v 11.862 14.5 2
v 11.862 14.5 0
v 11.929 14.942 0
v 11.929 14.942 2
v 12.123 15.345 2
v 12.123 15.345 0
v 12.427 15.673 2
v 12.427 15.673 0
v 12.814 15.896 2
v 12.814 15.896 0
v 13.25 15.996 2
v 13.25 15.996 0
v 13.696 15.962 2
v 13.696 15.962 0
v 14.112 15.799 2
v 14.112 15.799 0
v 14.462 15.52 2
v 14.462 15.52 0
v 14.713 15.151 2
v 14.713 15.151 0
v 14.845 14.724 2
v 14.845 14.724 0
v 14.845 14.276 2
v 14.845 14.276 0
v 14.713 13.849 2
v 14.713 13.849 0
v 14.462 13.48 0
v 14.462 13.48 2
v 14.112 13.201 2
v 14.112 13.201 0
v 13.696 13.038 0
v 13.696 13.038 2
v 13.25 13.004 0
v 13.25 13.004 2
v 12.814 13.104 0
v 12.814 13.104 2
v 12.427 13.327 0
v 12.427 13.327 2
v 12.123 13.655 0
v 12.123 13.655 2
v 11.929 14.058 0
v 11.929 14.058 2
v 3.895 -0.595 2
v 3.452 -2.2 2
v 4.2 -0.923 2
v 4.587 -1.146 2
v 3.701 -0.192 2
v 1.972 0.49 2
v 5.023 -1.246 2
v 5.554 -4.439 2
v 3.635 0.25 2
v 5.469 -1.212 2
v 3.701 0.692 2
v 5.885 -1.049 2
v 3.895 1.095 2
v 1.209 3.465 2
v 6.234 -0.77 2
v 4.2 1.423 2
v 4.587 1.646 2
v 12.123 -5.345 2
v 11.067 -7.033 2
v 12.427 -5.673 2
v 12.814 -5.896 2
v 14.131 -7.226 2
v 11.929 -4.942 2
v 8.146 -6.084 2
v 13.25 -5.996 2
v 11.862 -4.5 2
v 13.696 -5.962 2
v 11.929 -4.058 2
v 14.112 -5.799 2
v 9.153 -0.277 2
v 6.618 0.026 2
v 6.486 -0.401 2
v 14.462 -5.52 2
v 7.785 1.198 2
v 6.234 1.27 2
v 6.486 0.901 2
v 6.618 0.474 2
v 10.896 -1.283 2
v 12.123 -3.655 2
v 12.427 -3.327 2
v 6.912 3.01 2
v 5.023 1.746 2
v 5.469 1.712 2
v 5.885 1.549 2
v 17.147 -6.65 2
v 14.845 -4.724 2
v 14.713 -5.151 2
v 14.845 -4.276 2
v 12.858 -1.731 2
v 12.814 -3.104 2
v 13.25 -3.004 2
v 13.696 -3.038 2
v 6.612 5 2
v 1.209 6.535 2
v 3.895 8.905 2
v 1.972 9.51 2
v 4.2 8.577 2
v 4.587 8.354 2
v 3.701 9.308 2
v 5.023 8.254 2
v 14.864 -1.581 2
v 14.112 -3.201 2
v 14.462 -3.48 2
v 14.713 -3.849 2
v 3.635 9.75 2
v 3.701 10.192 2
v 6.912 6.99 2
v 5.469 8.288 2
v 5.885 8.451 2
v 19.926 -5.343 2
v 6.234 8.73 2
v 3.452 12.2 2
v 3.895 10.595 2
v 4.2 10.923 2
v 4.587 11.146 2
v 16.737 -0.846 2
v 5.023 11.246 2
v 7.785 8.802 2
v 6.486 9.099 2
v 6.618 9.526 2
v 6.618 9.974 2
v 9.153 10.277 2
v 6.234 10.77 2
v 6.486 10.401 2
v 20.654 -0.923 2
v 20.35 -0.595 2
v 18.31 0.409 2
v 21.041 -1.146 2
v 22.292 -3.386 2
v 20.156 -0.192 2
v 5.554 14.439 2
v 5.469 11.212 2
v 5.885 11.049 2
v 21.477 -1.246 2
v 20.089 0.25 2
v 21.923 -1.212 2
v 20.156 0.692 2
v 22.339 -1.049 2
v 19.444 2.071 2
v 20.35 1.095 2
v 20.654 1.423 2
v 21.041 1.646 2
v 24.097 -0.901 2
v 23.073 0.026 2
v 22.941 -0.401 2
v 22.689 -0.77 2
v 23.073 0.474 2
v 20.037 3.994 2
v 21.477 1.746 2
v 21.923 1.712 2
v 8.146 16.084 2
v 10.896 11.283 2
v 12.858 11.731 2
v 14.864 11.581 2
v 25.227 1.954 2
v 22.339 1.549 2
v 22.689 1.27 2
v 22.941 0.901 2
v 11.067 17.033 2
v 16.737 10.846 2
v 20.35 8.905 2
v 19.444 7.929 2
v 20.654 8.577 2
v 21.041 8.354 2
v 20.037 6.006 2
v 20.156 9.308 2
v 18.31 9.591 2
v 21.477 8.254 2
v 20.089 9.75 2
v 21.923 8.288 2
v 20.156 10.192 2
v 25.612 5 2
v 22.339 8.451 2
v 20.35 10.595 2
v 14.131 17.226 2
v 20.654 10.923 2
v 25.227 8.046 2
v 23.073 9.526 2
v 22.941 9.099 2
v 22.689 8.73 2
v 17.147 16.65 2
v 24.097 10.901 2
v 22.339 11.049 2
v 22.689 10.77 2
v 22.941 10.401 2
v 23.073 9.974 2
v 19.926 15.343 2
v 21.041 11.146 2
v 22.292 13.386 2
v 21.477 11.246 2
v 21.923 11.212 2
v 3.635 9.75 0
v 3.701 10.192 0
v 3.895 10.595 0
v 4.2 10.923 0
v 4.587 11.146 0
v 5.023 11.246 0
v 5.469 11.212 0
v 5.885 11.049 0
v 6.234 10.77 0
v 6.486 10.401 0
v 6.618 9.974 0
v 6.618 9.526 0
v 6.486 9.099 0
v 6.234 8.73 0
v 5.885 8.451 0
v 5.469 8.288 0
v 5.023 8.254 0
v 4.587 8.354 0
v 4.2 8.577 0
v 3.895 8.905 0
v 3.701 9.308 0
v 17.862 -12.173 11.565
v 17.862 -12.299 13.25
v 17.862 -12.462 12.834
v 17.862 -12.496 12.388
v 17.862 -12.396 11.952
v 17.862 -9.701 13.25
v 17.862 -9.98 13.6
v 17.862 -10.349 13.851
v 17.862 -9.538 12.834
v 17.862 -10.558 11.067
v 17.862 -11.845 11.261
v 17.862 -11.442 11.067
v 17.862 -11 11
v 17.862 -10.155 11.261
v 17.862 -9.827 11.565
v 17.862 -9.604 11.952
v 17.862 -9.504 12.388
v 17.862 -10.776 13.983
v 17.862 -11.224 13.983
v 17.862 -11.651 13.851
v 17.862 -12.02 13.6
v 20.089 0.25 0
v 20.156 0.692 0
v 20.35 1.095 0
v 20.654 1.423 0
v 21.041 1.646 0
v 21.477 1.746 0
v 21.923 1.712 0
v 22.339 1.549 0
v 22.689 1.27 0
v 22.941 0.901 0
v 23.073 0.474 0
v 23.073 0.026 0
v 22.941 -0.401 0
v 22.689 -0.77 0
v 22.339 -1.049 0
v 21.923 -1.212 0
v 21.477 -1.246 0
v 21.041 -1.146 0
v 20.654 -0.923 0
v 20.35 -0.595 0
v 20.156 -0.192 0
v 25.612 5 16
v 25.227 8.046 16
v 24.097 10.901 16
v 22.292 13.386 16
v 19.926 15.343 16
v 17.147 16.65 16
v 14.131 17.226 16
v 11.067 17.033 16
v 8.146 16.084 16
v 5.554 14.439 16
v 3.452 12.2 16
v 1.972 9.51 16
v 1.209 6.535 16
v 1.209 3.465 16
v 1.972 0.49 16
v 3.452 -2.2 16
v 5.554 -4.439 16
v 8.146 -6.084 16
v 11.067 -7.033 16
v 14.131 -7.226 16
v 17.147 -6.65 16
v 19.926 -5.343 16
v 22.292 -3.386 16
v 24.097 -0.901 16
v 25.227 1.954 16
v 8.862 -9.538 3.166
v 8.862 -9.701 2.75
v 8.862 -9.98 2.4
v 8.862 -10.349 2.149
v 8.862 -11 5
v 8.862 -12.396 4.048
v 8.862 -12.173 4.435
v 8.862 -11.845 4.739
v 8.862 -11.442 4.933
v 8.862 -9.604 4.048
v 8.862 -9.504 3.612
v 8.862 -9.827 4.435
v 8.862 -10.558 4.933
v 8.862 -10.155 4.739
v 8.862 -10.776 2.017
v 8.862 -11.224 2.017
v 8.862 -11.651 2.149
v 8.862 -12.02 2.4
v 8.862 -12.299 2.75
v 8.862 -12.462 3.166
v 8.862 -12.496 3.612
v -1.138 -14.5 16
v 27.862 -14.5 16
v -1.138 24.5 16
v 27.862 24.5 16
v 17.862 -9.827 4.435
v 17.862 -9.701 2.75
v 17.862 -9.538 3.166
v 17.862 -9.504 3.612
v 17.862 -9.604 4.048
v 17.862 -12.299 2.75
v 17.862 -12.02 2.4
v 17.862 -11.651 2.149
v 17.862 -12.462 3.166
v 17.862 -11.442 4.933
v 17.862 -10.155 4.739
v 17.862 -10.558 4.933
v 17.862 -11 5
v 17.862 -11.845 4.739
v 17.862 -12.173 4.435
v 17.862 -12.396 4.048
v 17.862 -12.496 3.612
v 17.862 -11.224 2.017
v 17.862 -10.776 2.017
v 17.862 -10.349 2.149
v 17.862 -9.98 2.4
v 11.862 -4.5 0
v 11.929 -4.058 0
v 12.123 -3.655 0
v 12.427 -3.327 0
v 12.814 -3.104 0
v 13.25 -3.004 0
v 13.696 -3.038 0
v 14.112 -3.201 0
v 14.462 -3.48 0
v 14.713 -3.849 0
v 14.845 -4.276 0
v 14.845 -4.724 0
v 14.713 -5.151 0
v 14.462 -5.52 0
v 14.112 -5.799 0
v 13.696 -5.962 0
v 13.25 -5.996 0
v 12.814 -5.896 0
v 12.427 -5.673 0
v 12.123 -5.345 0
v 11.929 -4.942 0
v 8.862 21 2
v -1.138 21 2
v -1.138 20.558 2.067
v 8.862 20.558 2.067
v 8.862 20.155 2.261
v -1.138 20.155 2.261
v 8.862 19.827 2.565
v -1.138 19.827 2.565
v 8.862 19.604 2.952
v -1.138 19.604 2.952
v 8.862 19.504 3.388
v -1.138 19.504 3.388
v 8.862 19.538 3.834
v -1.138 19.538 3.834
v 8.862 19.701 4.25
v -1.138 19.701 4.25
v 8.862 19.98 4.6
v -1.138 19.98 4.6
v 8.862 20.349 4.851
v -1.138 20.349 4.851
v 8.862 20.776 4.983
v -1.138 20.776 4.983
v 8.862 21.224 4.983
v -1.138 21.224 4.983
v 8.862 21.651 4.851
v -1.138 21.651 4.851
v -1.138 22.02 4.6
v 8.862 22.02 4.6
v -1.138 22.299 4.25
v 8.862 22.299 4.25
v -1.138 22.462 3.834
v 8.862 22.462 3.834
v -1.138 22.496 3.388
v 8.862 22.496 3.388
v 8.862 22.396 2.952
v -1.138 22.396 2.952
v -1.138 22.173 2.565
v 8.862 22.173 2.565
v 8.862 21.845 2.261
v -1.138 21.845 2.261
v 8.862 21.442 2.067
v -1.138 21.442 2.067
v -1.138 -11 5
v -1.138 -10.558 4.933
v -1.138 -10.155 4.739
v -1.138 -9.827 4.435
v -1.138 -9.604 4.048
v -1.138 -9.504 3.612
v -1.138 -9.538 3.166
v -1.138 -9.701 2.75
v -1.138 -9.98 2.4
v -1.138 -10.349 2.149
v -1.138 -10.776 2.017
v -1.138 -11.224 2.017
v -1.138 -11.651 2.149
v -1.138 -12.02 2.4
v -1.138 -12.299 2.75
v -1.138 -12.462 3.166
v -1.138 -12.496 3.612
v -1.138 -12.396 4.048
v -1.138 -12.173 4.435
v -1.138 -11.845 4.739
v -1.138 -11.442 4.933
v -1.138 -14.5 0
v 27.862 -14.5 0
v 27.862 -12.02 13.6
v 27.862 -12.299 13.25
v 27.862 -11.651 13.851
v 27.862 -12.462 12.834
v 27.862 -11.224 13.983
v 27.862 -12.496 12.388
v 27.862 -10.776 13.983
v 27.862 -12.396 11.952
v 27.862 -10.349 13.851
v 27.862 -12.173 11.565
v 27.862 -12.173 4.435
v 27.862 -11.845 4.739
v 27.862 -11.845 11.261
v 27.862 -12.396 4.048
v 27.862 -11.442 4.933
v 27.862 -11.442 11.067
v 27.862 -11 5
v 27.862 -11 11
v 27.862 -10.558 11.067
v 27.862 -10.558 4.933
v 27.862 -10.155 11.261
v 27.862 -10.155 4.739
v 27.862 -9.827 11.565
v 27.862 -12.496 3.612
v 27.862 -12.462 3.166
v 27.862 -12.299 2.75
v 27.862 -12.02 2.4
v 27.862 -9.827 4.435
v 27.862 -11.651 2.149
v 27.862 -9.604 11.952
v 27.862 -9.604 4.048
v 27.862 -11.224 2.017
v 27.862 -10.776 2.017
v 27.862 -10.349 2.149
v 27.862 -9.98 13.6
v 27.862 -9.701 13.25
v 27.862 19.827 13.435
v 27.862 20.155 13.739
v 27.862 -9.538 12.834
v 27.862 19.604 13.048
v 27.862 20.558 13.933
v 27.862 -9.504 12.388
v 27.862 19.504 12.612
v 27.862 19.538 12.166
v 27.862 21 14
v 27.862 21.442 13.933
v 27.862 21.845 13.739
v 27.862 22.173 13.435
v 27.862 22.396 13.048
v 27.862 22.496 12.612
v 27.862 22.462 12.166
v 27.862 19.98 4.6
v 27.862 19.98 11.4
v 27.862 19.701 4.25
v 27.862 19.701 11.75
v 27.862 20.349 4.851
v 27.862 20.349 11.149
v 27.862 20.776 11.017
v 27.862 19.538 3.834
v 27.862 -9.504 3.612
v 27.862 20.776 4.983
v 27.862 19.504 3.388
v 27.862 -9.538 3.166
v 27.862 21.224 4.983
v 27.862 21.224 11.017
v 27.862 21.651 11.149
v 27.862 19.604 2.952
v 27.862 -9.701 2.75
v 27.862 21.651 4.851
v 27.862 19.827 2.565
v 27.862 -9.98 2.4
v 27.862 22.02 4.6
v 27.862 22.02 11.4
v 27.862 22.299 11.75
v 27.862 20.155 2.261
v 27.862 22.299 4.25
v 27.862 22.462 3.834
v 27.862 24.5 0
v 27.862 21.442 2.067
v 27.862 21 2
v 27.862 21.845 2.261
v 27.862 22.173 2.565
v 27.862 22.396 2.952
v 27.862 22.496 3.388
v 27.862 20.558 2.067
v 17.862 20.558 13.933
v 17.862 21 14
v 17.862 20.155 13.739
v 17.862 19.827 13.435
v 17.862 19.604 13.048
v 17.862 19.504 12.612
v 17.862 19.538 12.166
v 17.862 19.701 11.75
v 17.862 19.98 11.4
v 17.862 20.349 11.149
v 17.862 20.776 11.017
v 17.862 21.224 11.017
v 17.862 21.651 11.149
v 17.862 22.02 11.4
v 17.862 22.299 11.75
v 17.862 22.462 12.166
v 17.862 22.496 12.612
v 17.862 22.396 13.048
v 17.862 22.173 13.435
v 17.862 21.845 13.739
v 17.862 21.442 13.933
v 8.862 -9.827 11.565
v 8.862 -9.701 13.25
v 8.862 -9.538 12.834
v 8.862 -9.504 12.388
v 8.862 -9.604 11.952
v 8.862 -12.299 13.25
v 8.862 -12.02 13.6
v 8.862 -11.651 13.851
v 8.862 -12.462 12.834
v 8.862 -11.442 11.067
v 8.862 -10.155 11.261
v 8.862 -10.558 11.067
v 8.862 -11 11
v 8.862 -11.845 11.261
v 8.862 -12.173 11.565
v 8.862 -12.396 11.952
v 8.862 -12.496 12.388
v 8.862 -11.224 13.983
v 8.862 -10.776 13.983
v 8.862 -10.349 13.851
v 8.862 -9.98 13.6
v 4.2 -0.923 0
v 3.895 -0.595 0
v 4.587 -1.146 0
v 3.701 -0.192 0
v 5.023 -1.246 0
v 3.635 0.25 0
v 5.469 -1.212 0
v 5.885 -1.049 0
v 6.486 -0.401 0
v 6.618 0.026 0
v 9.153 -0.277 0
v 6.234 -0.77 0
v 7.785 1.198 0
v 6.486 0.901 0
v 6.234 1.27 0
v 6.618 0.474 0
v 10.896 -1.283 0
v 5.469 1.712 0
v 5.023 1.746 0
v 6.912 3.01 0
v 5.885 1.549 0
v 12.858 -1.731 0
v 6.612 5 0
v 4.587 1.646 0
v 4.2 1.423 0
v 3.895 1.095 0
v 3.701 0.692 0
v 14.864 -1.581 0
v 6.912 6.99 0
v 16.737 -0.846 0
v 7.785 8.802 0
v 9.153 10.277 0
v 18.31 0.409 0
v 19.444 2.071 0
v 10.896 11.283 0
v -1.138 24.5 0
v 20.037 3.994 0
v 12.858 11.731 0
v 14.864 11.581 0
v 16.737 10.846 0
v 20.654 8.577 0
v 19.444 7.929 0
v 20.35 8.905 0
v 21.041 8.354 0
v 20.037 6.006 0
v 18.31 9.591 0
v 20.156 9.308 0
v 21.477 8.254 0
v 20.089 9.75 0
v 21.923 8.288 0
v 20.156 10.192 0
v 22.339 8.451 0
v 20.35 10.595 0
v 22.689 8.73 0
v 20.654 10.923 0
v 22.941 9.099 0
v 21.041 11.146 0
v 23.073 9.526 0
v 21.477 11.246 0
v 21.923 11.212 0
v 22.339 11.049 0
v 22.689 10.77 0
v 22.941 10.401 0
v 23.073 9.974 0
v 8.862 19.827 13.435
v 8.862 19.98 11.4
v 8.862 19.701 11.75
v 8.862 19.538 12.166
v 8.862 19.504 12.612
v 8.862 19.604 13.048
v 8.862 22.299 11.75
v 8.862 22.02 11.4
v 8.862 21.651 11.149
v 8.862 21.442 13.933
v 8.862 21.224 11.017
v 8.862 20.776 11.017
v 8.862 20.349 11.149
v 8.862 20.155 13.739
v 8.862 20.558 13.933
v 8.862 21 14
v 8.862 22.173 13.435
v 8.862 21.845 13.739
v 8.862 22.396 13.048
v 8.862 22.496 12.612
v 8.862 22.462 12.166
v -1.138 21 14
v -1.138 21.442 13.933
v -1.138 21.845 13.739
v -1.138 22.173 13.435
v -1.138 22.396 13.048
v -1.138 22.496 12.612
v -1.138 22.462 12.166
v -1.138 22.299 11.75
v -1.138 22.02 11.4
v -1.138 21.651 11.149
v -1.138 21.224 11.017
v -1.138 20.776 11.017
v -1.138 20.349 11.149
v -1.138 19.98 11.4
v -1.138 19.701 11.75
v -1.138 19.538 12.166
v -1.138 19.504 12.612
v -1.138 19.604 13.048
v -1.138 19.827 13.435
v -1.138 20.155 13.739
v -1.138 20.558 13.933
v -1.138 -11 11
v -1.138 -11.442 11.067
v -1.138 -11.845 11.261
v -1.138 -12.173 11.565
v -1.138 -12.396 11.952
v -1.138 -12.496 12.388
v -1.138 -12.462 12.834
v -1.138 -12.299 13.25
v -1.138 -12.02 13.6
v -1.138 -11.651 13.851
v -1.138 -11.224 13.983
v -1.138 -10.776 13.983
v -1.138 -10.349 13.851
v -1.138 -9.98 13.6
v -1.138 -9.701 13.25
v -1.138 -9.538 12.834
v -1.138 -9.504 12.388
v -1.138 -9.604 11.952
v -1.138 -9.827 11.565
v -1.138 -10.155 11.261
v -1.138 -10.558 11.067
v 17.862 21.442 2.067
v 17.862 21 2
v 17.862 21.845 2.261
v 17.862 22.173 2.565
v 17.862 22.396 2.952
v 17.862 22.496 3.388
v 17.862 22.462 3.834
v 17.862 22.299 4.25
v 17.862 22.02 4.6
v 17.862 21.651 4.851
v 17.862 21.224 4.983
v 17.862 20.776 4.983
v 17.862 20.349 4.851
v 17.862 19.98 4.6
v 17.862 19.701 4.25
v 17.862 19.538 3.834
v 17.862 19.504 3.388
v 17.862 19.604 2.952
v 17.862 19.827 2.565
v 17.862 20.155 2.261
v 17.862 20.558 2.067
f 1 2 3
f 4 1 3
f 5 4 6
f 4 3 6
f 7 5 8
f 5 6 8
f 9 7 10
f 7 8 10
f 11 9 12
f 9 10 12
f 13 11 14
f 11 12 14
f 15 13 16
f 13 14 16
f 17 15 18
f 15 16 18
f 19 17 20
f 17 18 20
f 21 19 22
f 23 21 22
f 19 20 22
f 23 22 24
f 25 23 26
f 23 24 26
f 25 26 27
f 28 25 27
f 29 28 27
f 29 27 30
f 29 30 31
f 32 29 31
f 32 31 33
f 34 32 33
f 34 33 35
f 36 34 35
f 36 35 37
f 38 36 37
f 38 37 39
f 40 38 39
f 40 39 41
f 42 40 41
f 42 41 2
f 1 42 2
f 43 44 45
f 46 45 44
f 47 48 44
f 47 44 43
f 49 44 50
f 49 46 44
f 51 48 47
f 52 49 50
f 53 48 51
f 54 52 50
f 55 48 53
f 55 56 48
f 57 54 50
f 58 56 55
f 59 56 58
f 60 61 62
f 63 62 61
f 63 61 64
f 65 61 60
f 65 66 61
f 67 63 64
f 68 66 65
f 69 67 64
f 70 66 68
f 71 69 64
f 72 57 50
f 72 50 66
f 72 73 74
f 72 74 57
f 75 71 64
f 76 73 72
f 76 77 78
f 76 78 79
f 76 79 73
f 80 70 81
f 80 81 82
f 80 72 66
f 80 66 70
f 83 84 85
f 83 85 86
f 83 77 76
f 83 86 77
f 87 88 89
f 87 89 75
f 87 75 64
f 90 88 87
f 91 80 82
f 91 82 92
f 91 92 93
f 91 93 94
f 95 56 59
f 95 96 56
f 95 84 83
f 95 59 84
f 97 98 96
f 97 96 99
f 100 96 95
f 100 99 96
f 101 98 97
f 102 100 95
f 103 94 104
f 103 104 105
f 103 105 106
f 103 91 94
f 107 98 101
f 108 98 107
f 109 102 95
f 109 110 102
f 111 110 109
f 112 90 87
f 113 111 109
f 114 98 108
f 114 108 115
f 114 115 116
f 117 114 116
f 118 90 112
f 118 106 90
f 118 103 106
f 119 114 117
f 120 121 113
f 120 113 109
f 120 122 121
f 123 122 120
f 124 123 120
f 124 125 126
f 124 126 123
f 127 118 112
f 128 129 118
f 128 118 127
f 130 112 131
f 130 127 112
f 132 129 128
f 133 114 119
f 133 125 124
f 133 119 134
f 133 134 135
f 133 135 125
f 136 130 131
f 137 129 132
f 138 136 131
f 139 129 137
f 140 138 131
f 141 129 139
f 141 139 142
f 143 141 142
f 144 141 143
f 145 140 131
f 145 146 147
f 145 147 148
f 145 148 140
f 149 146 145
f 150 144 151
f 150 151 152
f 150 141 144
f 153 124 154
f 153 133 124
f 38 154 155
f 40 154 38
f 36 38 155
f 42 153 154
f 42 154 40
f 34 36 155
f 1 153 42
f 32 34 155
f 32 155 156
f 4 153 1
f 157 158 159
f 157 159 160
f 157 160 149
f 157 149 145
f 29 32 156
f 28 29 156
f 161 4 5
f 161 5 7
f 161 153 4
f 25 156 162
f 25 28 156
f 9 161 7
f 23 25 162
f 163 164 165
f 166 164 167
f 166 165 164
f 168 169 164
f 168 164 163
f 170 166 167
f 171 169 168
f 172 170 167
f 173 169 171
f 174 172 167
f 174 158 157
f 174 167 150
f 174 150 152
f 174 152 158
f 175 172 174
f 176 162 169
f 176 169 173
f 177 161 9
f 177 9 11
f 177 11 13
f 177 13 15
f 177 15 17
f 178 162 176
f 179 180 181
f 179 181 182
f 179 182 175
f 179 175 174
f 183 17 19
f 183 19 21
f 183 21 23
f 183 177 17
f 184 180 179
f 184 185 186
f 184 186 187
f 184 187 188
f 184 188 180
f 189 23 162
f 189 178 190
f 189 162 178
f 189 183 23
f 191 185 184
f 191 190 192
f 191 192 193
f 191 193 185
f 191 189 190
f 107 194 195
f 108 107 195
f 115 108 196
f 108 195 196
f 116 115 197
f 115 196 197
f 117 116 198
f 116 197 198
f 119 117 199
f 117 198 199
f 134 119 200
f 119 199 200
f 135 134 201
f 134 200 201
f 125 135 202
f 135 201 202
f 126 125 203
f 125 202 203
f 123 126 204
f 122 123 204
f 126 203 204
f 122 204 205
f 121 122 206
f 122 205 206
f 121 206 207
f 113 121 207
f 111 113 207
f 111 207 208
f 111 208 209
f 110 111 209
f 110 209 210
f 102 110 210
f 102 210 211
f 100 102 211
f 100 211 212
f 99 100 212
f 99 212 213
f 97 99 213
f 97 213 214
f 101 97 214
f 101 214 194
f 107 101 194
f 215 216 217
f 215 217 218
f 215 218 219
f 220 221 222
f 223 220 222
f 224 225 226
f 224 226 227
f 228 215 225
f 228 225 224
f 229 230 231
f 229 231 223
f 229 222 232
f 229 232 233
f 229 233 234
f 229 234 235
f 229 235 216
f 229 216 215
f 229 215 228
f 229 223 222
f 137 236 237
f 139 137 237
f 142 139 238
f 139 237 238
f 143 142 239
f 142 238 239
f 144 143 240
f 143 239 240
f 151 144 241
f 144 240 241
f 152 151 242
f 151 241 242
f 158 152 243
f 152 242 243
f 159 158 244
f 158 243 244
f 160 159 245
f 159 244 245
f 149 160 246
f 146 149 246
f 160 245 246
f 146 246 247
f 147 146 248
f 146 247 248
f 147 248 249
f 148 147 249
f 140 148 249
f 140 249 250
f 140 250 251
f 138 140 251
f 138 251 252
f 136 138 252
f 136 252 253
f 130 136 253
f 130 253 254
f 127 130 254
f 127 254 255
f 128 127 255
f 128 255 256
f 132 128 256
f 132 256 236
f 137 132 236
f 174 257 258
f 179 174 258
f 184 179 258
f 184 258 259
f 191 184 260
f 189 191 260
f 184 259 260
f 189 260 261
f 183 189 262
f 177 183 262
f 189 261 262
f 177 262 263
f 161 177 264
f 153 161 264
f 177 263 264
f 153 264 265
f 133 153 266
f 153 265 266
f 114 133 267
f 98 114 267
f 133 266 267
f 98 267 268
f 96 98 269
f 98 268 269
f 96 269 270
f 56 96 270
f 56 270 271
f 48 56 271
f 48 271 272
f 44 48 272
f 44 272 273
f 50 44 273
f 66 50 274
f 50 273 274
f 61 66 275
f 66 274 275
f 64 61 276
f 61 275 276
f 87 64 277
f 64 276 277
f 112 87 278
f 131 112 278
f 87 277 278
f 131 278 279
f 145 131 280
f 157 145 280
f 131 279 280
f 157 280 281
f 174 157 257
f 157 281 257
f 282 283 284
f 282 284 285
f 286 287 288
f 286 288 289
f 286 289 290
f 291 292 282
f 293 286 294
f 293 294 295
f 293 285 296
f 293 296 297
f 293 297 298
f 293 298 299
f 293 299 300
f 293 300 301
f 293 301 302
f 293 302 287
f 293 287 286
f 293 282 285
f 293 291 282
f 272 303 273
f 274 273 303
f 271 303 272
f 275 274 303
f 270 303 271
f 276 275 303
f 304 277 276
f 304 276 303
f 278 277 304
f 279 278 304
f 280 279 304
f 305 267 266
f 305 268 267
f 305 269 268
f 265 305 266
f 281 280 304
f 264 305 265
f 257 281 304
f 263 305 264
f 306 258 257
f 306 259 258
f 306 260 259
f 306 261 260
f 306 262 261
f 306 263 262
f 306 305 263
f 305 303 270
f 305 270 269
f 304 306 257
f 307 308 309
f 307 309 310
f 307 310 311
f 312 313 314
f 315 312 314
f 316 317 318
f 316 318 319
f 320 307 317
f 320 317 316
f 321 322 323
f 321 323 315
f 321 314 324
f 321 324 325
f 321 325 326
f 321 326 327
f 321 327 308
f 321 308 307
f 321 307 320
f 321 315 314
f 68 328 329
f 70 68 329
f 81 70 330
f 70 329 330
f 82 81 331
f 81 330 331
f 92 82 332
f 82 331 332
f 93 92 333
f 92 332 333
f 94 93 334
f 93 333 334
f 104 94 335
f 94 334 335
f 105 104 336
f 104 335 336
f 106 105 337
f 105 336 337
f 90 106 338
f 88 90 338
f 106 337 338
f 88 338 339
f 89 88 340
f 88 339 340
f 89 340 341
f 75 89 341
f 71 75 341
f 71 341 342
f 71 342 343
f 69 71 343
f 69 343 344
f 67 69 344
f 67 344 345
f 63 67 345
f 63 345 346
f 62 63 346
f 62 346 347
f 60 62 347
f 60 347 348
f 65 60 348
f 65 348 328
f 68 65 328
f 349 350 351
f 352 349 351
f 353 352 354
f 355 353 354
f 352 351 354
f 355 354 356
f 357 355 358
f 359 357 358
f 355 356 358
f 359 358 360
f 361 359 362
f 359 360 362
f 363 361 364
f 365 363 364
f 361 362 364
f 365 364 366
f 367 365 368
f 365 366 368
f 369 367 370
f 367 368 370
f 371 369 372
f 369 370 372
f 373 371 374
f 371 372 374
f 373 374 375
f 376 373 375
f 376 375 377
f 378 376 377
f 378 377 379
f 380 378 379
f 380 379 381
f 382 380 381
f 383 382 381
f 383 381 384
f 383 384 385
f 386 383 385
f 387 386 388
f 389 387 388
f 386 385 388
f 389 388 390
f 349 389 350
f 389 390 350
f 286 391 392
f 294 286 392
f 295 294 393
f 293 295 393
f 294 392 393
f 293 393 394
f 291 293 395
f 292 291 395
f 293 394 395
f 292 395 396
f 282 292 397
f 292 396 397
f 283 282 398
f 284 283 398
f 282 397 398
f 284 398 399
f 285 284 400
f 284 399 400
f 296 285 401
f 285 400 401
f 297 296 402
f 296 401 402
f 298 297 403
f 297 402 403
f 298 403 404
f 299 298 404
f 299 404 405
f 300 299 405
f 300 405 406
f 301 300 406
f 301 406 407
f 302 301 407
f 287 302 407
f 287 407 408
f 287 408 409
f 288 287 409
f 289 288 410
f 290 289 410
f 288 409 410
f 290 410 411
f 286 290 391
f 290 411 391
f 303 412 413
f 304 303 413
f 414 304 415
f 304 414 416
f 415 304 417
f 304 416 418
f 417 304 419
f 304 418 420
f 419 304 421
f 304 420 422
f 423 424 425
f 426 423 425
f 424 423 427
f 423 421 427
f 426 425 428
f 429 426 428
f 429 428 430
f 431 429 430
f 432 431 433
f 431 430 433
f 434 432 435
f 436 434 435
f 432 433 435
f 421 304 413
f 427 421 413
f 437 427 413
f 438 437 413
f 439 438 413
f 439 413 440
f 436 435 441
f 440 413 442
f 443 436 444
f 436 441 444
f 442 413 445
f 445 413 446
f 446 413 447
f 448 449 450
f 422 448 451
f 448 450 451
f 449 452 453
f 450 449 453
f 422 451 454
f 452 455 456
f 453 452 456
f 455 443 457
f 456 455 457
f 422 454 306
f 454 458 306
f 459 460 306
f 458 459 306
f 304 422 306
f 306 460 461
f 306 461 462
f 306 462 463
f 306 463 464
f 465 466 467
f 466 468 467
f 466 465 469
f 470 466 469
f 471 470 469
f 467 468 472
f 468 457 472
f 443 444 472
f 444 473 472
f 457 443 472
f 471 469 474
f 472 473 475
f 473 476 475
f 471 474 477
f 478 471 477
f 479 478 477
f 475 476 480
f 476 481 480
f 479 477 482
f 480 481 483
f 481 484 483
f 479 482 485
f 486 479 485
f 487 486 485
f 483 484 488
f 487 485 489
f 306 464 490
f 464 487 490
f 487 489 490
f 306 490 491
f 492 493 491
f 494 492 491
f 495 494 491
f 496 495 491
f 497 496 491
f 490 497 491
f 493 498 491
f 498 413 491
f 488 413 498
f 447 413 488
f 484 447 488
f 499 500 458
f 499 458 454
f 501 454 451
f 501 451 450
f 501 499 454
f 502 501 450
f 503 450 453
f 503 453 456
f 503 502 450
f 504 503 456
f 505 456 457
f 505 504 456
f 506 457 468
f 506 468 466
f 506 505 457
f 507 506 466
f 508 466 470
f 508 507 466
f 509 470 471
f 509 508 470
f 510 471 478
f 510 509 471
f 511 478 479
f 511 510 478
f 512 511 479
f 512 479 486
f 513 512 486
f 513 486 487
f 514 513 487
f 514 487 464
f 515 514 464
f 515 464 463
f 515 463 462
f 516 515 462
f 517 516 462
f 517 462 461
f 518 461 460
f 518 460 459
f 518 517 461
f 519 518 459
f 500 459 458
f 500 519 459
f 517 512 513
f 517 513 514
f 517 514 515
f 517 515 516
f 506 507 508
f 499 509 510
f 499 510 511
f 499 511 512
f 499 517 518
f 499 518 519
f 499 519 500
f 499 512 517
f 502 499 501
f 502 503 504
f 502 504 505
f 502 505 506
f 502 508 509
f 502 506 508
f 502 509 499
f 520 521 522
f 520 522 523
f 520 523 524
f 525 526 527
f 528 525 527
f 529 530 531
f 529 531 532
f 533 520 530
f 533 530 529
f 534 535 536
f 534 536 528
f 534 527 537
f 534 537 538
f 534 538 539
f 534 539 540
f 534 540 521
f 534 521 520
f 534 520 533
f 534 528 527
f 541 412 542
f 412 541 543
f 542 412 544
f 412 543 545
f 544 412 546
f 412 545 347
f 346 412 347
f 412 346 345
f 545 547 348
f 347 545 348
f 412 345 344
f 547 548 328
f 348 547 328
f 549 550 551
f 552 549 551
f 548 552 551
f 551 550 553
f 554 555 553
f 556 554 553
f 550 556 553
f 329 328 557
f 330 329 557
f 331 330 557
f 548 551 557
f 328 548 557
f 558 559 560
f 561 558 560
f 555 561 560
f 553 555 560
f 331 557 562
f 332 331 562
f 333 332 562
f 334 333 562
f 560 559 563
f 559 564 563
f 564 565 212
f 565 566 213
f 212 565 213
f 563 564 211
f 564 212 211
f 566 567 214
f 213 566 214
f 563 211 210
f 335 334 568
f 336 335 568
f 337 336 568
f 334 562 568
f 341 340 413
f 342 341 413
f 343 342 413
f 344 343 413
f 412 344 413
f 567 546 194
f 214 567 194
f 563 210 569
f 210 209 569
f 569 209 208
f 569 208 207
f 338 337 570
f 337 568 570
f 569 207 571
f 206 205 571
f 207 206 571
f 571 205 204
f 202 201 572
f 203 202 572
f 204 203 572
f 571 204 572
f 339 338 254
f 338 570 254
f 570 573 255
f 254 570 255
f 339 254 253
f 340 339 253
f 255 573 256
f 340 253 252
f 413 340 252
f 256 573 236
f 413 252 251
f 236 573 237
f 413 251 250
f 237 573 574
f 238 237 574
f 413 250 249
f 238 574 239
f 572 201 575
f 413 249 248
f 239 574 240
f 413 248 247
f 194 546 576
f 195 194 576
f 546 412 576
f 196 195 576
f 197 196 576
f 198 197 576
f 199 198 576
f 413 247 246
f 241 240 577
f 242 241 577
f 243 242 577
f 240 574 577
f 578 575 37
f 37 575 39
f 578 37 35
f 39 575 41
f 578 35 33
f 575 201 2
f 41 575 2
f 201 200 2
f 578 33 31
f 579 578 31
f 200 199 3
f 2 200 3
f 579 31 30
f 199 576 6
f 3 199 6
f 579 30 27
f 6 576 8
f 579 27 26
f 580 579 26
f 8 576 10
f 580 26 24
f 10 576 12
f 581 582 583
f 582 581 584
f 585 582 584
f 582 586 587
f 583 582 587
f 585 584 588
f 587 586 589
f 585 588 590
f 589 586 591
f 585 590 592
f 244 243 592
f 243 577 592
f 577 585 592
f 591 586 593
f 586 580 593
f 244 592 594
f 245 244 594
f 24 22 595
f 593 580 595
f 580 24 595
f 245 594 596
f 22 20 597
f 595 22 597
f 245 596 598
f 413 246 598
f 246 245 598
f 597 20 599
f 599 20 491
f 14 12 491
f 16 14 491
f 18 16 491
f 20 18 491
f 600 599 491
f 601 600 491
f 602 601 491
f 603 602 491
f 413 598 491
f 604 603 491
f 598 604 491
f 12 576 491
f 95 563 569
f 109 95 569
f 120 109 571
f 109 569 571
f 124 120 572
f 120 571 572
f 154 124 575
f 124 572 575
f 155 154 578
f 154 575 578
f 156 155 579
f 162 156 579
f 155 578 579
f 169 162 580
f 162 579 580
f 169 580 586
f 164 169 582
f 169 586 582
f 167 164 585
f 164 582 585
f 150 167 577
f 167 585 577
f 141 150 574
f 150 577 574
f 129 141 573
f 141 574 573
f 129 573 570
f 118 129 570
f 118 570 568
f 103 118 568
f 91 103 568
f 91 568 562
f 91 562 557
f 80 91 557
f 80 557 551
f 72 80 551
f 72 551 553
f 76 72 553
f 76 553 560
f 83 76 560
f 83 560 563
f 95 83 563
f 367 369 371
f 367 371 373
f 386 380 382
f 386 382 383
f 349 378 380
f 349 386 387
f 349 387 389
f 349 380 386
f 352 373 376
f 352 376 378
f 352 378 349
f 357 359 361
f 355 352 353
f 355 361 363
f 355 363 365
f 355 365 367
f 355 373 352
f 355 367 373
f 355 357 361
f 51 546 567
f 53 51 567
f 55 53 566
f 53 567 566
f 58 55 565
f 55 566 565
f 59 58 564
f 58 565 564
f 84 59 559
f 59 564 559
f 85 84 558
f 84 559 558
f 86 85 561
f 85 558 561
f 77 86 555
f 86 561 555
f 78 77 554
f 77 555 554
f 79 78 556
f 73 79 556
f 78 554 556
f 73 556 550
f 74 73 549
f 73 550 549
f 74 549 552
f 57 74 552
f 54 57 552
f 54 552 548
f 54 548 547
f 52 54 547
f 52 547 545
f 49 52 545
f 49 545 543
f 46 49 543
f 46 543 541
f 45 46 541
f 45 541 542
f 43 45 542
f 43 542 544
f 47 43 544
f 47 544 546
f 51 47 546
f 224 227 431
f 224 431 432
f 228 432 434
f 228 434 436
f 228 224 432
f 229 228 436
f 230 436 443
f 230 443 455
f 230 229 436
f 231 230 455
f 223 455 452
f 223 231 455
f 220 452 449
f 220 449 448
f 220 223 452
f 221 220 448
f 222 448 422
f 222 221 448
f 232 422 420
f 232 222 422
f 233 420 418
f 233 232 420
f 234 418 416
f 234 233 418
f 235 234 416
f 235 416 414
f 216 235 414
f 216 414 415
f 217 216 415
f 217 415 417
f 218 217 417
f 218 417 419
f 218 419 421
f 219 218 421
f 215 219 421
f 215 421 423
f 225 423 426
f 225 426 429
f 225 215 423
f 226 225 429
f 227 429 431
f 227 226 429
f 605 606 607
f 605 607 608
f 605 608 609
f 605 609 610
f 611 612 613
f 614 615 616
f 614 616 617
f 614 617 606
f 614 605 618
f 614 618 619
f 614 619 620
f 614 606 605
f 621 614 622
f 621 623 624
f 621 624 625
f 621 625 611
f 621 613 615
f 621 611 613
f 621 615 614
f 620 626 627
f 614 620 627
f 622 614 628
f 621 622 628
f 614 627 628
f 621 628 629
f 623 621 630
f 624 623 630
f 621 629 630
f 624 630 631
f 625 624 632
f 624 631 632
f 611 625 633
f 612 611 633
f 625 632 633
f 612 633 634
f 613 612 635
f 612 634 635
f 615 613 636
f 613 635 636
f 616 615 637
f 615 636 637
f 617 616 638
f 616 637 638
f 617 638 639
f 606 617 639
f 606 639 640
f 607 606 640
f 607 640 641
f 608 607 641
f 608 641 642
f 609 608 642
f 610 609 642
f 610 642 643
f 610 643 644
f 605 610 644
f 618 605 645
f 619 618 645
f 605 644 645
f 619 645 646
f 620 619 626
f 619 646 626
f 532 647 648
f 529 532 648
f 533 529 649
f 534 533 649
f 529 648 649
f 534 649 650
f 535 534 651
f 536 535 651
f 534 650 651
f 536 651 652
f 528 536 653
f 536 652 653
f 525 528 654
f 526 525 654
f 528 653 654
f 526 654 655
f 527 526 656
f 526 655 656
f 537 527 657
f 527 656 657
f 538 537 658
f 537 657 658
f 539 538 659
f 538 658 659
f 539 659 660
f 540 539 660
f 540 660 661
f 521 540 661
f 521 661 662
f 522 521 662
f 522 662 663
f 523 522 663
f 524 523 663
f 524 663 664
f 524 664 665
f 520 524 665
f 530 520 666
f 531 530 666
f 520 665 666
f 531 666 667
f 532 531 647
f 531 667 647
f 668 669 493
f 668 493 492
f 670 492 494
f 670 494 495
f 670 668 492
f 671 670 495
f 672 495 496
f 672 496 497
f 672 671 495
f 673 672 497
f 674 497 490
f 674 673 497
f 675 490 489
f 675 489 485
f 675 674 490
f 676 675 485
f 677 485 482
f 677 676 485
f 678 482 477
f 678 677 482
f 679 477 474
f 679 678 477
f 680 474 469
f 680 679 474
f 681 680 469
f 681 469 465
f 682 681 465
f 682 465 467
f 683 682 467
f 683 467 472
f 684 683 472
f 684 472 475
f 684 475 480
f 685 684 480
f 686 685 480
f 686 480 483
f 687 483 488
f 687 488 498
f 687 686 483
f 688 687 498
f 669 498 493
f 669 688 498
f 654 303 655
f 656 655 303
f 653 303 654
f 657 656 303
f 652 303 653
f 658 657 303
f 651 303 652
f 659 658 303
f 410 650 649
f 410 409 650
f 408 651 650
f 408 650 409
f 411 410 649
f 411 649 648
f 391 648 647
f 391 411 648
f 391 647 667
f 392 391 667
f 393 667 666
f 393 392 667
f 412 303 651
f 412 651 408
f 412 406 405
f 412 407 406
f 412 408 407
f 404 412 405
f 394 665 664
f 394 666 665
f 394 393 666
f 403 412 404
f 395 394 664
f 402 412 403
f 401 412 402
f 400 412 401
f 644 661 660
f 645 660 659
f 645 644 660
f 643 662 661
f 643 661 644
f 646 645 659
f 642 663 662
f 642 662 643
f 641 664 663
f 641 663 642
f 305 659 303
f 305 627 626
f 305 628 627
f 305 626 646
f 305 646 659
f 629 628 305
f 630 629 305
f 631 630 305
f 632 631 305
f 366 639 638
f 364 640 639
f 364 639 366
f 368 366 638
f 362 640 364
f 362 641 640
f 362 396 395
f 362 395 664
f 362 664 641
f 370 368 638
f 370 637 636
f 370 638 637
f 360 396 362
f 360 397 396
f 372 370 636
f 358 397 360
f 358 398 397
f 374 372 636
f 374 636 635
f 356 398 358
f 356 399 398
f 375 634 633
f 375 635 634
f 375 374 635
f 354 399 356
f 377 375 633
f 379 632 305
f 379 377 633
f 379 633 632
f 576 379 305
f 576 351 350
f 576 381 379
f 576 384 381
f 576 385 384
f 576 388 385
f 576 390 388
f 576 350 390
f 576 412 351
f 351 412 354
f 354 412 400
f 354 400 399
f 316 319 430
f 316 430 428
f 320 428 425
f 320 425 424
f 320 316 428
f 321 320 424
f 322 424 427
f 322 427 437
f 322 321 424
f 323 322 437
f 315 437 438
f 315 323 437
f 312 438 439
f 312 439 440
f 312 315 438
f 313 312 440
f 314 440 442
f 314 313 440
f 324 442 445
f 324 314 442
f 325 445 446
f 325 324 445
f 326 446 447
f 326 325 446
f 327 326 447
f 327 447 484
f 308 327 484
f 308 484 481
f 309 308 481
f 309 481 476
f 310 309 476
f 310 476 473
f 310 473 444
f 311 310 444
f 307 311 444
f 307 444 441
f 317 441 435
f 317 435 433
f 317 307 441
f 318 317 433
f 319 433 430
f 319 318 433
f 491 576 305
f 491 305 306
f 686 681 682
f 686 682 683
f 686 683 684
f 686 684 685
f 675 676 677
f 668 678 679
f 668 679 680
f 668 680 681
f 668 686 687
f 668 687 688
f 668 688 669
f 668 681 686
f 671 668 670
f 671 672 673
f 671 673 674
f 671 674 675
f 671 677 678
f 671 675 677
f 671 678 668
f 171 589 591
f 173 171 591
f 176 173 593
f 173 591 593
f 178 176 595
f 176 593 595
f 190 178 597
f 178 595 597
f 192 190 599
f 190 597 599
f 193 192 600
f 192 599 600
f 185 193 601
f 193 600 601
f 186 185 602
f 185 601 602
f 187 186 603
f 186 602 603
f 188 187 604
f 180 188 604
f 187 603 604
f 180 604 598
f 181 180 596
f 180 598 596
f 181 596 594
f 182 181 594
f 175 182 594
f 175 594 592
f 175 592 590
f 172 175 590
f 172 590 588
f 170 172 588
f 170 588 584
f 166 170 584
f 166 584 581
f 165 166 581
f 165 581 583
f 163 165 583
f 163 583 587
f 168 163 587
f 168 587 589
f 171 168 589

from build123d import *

# Parameters (mm, degrees)
SKETCH_1_W          = 29
SKETCH_1_H          = 39
EXTRUDE_1_DEPTH     = 16
SKETCH_2_R          = 12.25
CUT_EXTRUDE_1_DEPTH = 14
SKETCH_3_R          = 6.75
CUT_EXTRUDE_2_DEPTH = 14
SKETCH_4_R          = 1.5
CUT_EXTRUDE_3_DEPTH = 14
SKETCH_5_R          = 1.5
CUT_EXTRUDE_4_DEPTH = 10
CUT_EXTRUDE_START   = -10
SKETCH_6_R          = 1.5
CUT_EXTRUDE_6_DEPTH = 10


with BuildPart() as part:
    # 草图1 → 凸台-拉伸1 (new body)
    with BuildSketch(Plane.XY):
        with Locations((13.362025316, 5)):
            Rectangle(SKETCH_1_W, SKETCH_1_H)
    extrude(amount=EXTRUDE_1_DEPTH)

    # 草图2 → 切除-拉伸1 (cut)
    with BuildSketch(Plane.XY.offset(16)):
        with Locations((13.362025316, 5)):
            Circle(SKETCH_2_R)
    extrude(amount=-CUT_EXTRUDE_1_DEPTH, mode=Mode.SUBTRACT)

    # 草图3 → 切除-拉伸2 (cut)
    with BuildSketch(Plane(origin=(0, 0, 0), x_dir=(-1, 0, 0), z_dir=(0, 0, -1))):
        with Locations((-13.362025316, 5)):
            Circle(SKETCH_3_R)
    extrude(amount=-CUT_EXTRUDE_2_DEPTH, mode=Mode.SUBTRACT)

    # 草图4 → 切除-拉伸3 (cut)
    with BuildSketch(Plane(origin=(0, 0, 0), x_dir=(-1, 0, 0), z_dir=(0, 0, -1))):
        with Locations((-13.362025316, 14.5)):
            Circle(SKETCH_4_R)
        with Locations((-5.134783981, 9.75)):
            Circle(SKETCH_4_R)
        with Locations((-5.134783981, 0.25)):
            Circle(SKETCH_4_R)
        with Locations((-13.362025316, -4.5)):
            Circle(SKETCH_4_R)
        with Locations((-21.589266652, 0.25)):
            Circle(SKETCH_4_R)
        with Locations((-21.589266652, 9.75)):
            Circle(SKETCH_4_R)
    extrude(amount=-CUT_EXTRUDE_3_DEPTH, mode=Mode.SUBTRACT)

    # 草图5 → 切除-拉伸4 (cut)
    with BuildSketch(Plane.ZY.offset(1.137974684)):
        with Locations((12.5, 21)):
            Circle(SKETCH_5_R)
        with Locations(Location((3.5, 21, 0), (0, 0, 180))):
            Circle(SKETCH_5_R)
        with Locations(Location((12.5, -11, 0), (0, 0, 180))):
            Circle(SKETCH_5_R)
        with Locations((3.5, -11)):
            Circle(SKETCH_5_R)
    extrude(amount=-CUT_EXTRUDE_4_DEPTH, mode=Mode.SUBTRACT)

    # 草图6 → 切除-拉伸6 (cut)
    with BuildSketch(Plane(origin=(27.862025316, 0, 0), x_dir=(0, 0, -1), z_dir=(1, 0, 0)).offset(CUT_EXTRUDE_START)):
        with Locations((-12.5, -11)):
            Circle(SKETCH_6_R)
        with Locations(Location((-3.5, -11, 0), (0, 0, 180))):
            Circle(SKETCH_6_R)
        with Locations((-3.5, 21)):
            Circle(SKETCH_6_R)
        with Locations(Location((-12.5, 21, 0), (0, 0, 180))):
            Circle(SKETCH_6_R)
    extrude(amount=CUT_EXTRUDE_6_DEPTH, mode=Mode.SUBTRACT)


solid = part.part
